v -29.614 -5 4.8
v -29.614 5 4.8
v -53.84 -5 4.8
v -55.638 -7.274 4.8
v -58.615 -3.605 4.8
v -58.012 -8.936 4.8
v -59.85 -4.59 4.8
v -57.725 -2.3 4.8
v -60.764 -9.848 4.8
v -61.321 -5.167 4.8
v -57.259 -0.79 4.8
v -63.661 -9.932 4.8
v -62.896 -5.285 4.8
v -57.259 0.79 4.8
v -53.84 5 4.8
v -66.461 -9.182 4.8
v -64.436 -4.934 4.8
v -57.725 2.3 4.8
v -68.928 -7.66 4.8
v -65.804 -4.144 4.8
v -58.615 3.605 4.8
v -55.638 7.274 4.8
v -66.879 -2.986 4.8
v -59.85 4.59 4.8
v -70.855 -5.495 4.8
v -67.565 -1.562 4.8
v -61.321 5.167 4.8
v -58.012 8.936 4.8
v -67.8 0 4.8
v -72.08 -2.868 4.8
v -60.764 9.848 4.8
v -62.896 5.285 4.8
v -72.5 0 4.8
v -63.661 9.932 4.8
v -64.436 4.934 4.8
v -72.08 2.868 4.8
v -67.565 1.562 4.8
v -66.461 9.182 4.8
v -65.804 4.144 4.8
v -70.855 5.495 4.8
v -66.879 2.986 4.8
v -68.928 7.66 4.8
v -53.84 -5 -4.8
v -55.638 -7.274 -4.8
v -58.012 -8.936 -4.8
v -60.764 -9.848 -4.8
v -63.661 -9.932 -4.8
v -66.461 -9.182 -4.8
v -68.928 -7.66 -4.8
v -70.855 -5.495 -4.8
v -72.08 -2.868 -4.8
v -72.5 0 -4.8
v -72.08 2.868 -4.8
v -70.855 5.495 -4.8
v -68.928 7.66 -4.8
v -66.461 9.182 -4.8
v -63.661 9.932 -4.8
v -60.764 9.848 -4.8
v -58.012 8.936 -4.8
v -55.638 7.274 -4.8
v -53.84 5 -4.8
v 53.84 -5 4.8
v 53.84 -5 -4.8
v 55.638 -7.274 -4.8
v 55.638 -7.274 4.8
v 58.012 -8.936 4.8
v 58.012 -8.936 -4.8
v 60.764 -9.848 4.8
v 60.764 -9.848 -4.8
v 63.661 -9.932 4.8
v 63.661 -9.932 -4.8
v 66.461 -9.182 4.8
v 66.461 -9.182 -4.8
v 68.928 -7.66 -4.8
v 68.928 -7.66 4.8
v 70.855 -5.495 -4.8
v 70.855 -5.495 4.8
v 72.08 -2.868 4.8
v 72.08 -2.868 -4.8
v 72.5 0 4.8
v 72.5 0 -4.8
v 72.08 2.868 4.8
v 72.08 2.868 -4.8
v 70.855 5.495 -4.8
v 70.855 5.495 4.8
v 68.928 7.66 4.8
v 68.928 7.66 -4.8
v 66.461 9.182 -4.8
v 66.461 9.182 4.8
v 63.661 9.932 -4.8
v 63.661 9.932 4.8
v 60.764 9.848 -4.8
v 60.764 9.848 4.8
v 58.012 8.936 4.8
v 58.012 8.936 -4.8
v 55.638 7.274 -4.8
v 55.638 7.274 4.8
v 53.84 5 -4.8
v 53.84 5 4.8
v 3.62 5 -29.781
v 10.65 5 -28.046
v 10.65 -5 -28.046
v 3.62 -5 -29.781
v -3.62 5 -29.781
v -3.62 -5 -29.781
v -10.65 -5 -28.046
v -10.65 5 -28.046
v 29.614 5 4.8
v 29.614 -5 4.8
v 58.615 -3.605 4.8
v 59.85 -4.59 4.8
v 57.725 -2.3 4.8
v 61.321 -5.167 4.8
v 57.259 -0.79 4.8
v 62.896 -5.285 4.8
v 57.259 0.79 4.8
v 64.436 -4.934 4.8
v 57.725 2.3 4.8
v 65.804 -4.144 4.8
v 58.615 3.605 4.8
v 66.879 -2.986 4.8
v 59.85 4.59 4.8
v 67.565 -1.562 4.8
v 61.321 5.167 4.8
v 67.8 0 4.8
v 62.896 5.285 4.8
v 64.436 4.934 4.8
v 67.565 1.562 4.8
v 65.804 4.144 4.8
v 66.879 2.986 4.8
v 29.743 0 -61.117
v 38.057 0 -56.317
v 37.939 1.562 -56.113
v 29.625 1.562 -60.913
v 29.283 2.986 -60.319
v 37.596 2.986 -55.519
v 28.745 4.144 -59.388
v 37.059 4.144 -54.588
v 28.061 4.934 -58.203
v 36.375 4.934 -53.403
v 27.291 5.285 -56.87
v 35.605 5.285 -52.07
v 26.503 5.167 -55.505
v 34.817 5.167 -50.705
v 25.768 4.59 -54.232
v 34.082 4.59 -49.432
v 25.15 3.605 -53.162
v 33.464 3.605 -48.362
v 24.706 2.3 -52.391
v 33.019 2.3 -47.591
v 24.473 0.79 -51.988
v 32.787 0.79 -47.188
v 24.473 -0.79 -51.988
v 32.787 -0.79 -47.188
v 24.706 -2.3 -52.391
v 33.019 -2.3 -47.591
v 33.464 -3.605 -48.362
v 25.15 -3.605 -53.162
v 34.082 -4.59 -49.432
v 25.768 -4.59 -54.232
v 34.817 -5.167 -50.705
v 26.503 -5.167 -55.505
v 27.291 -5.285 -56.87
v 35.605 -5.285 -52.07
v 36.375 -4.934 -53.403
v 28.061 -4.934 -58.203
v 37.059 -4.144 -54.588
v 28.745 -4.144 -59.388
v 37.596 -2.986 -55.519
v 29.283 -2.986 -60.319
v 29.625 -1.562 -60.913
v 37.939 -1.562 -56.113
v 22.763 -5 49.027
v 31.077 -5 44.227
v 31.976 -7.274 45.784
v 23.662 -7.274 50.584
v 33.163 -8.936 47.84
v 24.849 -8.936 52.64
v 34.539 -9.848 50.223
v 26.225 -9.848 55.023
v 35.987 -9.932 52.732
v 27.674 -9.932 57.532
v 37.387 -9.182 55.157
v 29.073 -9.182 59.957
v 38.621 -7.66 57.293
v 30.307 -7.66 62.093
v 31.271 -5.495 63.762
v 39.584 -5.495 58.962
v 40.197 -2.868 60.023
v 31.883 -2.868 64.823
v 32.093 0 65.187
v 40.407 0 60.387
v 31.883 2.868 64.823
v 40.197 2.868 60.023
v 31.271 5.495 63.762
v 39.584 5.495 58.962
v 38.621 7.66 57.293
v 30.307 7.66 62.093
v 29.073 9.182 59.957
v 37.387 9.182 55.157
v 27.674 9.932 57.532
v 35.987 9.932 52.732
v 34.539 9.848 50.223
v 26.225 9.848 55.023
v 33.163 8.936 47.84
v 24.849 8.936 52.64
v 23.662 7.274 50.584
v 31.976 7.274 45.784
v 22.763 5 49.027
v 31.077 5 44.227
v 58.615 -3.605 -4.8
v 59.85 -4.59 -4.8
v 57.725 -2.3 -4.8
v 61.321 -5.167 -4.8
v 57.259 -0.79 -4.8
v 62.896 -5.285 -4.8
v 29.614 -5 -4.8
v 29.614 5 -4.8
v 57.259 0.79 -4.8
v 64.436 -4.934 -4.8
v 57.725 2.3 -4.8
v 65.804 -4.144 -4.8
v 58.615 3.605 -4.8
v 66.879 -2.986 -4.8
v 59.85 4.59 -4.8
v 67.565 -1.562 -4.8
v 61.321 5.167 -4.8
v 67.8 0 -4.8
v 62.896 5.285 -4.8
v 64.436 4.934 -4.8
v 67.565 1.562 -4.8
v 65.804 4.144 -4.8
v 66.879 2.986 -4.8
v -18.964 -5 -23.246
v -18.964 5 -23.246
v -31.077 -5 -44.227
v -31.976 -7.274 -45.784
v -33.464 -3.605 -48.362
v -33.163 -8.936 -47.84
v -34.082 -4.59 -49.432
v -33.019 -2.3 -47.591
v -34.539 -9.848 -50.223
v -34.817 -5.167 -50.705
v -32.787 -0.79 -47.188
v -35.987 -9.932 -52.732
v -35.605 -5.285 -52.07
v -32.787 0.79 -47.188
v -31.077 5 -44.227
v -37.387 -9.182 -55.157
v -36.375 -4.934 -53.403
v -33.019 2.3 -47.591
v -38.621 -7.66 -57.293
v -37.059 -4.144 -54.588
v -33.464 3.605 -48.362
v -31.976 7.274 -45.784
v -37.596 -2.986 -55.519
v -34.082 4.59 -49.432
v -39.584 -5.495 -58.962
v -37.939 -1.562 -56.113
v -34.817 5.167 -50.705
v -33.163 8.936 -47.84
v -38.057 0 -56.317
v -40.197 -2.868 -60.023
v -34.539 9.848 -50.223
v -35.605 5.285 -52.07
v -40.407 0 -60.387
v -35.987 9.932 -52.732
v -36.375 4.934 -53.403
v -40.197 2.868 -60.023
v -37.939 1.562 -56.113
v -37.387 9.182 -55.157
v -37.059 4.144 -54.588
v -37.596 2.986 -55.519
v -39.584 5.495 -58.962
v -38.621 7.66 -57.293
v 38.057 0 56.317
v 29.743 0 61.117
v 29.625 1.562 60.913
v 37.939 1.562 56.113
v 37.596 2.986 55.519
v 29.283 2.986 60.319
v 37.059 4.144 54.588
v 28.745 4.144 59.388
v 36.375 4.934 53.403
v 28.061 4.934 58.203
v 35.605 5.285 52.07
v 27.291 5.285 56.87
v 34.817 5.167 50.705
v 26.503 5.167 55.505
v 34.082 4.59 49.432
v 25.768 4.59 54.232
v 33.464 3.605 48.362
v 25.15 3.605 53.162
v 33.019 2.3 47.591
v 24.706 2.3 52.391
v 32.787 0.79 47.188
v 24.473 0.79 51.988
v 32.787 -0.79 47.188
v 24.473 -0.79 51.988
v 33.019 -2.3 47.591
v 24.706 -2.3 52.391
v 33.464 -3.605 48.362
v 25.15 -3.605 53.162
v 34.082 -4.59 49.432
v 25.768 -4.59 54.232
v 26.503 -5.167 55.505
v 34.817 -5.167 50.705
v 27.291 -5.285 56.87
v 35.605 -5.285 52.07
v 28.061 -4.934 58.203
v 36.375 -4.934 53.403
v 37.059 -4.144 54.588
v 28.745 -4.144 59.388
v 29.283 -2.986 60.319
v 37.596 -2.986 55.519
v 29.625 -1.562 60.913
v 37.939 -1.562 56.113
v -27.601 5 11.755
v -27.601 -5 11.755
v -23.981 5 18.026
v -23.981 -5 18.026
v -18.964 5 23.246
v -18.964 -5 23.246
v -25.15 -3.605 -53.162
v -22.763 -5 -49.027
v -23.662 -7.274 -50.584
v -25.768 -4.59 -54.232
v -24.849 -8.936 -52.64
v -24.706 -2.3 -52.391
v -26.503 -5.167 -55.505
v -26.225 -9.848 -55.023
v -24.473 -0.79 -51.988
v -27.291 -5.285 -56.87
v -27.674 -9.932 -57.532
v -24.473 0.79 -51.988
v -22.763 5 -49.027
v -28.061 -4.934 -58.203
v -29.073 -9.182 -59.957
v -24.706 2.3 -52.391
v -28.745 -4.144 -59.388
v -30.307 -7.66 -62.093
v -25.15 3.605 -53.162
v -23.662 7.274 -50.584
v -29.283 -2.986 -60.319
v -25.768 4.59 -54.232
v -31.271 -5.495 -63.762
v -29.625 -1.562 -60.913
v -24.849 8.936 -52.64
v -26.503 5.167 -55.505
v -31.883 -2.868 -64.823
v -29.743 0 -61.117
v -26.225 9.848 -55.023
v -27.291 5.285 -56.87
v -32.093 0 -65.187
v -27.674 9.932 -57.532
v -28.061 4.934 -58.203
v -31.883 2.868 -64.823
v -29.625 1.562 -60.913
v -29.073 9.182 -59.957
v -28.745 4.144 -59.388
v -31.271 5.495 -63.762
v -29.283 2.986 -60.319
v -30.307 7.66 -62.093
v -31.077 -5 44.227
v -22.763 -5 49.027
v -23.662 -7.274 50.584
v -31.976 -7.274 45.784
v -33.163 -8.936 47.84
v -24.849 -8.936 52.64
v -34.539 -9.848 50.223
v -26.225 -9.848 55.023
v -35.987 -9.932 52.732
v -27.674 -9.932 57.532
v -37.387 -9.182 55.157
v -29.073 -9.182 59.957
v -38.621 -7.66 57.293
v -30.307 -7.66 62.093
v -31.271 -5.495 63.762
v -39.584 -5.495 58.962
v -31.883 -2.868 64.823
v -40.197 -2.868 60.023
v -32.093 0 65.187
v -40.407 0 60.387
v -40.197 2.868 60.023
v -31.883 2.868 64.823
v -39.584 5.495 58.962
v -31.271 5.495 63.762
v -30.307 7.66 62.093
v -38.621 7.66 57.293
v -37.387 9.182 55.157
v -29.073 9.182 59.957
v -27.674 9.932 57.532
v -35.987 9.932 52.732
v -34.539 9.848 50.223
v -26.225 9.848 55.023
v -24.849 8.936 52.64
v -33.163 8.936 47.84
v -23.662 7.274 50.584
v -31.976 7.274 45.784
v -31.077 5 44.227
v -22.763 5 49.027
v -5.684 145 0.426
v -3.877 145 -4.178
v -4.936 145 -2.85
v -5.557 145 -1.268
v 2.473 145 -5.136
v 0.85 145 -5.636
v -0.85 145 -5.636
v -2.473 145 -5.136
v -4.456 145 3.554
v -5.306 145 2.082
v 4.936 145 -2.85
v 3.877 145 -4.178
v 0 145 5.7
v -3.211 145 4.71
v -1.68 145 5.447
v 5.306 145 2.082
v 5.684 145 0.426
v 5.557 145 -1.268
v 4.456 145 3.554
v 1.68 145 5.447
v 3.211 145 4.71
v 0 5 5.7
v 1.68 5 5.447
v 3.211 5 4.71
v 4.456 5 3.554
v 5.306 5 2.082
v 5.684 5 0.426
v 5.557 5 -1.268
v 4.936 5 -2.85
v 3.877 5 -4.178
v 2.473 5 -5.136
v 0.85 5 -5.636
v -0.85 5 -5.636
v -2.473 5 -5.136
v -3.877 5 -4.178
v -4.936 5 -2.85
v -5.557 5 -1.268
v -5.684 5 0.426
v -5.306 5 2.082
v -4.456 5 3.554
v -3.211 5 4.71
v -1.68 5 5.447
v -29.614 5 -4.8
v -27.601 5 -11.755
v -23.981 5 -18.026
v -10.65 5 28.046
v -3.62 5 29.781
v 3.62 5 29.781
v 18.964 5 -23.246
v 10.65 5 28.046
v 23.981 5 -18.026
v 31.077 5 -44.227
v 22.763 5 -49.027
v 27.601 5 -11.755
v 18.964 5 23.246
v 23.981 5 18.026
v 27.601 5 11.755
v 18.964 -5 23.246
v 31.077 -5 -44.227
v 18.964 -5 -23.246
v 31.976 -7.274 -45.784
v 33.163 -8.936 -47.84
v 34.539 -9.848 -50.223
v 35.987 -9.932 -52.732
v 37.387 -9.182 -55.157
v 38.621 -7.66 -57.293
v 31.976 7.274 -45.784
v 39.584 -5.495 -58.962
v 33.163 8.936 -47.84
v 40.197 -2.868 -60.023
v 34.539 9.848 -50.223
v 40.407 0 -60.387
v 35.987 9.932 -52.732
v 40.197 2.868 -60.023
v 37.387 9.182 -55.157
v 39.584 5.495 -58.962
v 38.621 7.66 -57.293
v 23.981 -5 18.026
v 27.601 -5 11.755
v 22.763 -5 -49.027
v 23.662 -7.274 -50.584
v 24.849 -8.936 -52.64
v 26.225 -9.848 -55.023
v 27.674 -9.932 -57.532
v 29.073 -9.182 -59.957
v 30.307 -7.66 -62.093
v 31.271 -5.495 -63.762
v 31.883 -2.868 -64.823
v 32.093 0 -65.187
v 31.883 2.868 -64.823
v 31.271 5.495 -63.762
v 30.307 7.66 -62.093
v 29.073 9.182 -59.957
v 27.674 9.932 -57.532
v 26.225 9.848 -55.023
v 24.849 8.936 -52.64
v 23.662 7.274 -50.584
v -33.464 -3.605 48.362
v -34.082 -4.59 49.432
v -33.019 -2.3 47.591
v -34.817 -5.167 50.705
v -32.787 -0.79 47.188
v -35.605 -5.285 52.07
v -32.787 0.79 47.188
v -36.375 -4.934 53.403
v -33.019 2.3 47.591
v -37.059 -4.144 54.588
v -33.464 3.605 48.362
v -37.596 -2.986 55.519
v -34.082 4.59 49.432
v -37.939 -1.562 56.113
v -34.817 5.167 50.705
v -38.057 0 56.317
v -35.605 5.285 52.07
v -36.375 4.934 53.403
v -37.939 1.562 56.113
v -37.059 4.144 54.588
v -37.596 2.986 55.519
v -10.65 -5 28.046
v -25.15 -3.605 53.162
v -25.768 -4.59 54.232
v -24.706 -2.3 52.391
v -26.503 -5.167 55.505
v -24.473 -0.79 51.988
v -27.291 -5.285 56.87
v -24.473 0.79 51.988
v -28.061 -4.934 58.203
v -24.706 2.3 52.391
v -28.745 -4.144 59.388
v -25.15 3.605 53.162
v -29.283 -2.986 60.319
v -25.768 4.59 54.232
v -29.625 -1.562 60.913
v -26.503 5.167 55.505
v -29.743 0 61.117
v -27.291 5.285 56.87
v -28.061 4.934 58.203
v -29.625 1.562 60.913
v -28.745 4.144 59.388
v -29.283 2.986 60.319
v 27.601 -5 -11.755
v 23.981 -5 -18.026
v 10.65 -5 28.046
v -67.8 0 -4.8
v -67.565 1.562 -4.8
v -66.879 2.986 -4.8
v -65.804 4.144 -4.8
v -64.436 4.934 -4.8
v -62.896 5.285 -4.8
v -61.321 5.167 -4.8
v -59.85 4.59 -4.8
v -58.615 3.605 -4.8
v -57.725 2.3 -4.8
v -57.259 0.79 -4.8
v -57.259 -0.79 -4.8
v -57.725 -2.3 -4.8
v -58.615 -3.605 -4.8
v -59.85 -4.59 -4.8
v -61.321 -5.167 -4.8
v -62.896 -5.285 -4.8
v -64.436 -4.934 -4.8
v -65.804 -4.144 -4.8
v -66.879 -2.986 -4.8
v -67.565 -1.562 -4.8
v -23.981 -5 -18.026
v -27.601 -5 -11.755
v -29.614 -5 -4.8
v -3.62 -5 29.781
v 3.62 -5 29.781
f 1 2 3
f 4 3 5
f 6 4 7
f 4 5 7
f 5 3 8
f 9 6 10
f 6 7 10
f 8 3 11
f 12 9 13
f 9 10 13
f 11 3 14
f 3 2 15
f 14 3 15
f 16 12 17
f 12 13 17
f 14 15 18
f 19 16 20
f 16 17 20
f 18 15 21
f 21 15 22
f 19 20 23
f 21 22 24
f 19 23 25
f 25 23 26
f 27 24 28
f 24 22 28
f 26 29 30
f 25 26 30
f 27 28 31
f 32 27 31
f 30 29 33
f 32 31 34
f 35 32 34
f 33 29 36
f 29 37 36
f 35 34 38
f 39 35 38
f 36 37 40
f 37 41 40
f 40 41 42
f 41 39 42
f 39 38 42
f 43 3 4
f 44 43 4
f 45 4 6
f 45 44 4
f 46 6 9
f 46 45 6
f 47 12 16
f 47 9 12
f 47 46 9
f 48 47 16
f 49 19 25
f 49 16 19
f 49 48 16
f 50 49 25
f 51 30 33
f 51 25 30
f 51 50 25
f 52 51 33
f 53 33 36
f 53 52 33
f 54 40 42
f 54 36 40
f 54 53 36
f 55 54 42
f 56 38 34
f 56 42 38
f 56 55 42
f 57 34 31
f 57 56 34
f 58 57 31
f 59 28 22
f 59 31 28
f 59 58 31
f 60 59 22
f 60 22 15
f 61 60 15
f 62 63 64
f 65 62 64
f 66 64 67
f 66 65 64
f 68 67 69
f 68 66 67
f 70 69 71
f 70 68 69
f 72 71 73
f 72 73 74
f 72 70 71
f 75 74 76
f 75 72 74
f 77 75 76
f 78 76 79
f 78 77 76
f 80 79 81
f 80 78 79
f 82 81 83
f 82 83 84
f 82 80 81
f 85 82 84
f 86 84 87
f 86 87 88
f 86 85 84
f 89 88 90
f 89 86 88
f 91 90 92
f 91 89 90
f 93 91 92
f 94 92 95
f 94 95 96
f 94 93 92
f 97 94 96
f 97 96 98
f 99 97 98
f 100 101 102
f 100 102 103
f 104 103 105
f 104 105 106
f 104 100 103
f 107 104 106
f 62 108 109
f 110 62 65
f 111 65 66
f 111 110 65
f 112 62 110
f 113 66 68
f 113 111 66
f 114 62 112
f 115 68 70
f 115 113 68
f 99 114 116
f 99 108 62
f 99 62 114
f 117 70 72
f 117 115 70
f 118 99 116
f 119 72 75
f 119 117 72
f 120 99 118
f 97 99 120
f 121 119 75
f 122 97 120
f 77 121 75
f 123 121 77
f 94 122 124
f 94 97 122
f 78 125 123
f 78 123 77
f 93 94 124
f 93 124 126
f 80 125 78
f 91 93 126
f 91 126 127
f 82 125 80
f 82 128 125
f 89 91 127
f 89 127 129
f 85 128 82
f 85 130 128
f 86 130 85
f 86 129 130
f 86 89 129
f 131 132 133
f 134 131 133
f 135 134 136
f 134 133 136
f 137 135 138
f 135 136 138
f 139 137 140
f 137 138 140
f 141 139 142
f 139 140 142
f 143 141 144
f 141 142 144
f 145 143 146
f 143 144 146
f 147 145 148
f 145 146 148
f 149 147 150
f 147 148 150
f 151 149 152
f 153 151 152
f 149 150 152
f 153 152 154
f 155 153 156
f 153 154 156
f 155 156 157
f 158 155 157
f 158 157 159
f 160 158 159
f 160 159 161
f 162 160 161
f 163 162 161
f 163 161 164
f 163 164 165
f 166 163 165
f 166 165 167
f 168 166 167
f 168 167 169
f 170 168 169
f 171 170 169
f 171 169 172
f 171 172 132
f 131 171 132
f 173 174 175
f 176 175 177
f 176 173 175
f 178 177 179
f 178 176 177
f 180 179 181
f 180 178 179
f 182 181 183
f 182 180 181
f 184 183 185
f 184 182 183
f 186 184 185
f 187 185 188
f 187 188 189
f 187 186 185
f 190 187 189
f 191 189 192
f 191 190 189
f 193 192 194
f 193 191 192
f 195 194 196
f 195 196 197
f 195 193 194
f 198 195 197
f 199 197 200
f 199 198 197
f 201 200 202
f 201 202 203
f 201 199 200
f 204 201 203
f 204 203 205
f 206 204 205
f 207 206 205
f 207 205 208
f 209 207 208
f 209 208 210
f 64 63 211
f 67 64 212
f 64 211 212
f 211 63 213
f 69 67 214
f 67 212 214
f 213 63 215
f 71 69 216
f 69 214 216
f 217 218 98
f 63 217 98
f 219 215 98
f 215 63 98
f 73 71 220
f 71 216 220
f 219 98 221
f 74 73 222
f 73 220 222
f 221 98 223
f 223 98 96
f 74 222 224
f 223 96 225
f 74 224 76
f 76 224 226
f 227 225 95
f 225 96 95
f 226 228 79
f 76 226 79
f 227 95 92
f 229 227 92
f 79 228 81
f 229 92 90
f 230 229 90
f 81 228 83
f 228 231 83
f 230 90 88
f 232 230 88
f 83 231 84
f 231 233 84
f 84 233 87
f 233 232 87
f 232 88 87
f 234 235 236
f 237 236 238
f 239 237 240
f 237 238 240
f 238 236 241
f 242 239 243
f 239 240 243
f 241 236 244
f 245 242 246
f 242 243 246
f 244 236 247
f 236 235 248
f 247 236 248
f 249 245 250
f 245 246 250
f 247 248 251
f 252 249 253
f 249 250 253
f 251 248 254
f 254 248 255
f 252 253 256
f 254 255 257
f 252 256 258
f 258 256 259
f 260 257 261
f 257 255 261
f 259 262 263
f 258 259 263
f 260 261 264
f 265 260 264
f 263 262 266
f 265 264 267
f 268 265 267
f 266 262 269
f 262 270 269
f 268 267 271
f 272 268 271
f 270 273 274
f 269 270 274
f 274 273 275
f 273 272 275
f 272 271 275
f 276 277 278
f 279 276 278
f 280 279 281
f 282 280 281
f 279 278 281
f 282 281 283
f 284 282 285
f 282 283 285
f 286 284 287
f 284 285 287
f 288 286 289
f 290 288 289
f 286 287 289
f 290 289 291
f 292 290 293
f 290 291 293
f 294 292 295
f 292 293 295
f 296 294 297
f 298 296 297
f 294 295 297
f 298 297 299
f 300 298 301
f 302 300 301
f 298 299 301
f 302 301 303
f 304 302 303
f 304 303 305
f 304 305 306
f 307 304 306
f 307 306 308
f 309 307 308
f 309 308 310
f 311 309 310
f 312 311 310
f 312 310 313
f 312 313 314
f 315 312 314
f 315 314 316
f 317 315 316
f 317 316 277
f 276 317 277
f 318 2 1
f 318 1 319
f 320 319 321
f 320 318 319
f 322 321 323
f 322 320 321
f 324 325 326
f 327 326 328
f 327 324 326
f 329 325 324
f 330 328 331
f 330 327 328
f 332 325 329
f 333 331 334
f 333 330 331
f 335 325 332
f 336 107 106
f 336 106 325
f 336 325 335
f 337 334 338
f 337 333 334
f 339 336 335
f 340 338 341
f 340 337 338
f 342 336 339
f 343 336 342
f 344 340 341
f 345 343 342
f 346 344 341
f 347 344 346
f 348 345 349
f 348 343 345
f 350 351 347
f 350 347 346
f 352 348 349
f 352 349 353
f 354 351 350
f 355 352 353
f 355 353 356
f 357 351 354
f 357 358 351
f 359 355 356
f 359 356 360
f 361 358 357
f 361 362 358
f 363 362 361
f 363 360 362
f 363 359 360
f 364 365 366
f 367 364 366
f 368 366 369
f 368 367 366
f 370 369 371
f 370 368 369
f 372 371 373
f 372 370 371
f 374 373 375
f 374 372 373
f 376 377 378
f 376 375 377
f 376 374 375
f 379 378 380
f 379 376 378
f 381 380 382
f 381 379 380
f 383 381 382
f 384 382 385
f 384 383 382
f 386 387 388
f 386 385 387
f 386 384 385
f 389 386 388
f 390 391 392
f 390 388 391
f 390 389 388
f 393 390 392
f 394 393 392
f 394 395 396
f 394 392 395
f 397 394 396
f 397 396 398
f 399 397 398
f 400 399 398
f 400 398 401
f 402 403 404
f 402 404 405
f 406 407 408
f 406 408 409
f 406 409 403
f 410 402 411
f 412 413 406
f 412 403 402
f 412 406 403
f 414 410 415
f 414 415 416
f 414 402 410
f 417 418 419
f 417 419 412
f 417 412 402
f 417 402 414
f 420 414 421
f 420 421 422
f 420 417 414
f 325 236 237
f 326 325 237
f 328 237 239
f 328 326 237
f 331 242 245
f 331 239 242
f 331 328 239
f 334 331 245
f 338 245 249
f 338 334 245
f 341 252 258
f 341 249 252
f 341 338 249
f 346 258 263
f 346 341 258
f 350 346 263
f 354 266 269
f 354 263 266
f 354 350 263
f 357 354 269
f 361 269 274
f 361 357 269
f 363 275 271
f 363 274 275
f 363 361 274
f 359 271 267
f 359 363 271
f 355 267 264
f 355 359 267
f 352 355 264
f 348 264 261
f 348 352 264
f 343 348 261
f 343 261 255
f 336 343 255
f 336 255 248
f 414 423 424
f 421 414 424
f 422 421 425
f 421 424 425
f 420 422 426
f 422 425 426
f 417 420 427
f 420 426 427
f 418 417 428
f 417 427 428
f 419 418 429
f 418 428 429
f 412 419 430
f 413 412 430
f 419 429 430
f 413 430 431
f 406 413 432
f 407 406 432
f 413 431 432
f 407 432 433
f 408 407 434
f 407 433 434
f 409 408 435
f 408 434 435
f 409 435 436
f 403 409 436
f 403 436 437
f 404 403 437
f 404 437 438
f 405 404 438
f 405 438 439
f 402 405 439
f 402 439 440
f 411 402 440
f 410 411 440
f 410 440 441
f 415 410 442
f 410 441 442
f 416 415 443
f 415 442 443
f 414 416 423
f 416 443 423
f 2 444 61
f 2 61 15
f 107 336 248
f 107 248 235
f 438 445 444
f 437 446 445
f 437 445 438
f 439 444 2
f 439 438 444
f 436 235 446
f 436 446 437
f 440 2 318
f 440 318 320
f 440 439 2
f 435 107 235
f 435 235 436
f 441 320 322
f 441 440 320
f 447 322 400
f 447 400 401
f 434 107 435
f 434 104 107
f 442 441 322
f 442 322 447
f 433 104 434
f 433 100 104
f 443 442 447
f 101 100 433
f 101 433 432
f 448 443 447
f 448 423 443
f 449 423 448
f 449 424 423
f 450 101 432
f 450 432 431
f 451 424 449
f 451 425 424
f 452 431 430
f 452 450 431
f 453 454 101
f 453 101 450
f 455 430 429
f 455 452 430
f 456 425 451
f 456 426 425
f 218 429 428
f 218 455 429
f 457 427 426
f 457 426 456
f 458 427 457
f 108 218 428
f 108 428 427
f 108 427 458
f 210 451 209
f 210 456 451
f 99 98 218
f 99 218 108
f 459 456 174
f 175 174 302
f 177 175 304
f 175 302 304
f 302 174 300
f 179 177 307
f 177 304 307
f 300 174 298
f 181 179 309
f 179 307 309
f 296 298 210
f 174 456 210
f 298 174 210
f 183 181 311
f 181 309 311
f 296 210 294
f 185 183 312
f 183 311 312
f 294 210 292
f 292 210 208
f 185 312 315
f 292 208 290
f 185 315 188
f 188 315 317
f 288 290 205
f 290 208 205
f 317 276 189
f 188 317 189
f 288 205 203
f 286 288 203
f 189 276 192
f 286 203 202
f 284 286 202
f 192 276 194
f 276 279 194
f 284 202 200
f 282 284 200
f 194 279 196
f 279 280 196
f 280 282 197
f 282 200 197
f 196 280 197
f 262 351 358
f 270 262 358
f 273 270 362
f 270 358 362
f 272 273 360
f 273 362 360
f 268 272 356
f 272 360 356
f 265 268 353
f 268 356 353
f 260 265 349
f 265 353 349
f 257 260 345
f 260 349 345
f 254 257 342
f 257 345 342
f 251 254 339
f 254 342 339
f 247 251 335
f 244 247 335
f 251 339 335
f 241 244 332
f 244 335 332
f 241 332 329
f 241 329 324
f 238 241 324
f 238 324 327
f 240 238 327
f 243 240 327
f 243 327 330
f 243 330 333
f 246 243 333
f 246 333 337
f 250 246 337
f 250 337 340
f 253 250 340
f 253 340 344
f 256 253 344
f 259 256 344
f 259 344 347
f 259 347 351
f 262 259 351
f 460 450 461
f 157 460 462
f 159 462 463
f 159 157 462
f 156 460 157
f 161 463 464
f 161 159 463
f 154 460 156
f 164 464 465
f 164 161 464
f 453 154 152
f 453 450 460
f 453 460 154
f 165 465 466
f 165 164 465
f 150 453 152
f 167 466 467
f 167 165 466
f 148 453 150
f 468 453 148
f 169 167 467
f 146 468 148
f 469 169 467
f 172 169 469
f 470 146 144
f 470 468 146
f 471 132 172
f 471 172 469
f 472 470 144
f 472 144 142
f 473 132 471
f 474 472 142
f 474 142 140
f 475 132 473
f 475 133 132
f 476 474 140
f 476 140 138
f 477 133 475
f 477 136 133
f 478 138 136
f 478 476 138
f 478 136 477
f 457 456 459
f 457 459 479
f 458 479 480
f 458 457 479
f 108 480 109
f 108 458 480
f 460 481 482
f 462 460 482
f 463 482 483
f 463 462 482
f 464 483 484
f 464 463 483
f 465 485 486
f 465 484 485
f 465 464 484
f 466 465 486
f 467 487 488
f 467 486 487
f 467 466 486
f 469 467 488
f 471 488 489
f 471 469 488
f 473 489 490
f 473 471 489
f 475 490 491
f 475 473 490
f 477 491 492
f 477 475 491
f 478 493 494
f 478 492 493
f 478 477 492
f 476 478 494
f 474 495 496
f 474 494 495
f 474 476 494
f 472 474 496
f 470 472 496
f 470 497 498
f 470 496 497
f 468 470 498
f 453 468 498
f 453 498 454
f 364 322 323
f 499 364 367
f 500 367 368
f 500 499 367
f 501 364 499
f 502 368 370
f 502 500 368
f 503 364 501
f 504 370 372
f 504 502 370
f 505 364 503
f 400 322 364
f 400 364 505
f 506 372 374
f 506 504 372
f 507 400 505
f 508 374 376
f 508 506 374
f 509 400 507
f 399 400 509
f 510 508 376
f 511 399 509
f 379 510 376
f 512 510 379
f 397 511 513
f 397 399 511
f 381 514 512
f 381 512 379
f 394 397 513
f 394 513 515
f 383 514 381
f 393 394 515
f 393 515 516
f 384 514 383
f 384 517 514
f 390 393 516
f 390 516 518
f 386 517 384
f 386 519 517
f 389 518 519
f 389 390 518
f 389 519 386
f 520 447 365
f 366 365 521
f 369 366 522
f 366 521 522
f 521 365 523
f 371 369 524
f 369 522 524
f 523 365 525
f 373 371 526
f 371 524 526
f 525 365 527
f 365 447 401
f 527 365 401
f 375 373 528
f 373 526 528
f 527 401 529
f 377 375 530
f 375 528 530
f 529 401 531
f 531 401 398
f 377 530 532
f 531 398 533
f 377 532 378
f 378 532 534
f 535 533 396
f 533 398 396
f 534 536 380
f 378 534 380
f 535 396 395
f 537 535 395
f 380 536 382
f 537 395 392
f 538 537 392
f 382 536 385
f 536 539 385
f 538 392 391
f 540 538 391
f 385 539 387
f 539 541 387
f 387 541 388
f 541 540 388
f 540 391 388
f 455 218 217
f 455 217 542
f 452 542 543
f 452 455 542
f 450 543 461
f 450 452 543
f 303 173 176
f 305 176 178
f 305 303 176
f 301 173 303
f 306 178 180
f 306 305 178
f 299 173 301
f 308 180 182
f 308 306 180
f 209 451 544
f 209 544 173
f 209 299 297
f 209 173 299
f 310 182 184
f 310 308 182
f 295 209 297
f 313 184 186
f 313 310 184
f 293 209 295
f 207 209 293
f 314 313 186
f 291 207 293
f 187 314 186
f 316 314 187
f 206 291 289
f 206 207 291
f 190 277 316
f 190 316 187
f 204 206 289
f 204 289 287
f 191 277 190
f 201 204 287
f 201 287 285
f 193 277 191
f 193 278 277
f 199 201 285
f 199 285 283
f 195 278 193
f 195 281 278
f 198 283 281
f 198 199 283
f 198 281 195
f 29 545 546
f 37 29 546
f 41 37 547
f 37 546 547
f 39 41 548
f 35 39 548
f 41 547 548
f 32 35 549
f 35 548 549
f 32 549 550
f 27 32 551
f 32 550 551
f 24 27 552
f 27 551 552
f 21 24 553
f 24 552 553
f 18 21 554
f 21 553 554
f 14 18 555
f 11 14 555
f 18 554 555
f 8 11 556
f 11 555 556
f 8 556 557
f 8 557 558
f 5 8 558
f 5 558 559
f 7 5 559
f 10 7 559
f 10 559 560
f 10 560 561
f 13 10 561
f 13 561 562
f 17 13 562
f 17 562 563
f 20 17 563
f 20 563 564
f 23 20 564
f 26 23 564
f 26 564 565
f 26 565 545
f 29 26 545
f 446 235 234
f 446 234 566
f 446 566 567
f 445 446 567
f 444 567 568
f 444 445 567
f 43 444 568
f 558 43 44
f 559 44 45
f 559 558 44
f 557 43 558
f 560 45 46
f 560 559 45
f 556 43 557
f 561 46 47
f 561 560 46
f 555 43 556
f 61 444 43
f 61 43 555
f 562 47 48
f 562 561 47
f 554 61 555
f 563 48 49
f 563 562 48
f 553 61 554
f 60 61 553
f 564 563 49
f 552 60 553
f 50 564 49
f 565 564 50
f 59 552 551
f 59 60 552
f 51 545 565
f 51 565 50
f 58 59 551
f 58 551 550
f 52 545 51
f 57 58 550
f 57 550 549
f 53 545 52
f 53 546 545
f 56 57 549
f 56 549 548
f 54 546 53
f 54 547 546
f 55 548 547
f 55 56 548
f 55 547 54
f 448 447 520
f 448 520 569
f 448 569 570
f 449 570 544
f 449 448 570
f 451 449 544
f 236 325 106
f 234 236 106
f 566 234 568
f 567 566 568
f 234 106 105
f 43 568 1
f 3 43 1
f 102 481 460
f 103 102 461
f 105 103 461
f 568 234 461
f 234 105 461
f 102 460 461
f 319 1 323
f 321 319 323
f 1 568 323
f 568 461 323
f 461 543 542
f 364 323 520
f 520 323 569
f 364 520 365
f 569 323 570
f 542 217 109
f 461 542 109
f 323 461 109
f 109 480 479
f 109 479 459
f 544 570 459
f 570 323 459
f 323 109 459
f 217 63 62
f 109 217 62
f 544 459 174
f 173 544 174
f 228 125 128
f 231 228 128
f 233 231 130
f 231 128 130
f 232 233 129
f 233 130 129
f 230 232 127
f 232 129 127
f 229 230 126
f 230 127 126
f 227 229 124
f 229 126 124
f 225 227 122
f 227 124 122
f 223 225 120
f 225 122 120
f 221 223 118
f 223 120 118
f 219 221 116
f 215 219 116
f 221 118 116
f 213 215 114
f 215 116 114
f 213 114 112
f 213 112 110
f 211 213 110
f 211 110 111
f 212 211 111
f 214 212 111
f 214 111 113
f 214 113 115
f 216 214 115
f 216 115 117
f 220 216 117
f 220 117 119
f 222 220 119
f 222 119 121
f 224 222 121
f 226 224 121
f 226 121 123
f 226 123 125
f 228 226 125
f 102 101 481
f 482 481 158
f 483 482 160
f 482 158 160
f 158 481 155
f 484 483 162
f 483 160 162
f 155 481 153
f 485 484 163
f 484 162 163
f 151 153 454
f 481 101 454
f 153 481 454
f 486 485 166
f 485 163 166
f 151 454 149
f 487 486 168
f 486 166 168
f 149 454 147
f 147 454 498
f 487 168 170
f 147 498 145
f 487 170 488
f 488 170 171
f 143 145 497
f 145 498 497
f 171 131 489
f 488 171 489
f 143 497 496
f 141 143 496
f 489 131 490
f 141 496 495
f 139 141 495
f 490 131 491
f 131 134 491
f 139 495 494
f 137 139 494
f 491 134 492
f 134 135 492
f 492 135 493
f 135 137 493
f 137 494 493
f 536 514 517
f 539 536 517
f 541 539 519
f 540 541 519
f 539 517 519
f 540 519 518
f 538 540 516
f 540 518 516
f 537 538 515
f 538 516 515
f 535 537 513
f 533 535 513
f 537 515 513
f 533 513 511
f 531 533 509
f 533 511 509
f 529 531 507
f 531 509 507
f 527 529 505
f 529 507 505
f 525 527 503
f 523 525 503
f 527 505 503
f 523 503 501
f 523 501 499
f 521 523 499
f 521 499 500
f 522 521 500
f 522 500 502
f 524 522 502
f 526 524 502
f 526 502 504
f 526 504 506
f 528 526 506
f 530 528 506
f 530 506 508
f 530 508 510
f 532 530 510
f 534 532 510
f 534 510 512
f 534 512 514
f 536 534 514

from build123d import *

# Parameters (mm, degrees)
SKETCH_1_R               = 30
EXTRUDE_1_DEPTH          = 5
SKETCH_2_W               = 50
SKETCH_2_H               = 9.6
EXTRUDE_2_DEPTH          = 5
SKETCH_3_R               = 10
EXTRUDE_3_DEPTH          = 9.6
SKETCH_4_R               = 5.3
CUT_EXTRUDE_1_DEPTH      = 10
PATTERN_CIRCULAR_1_COUNT = 6
SKETCH_5_R               = 5.7
EXTRUDE_11_4_140_DEPTH   = 140


with BuildPart() as part:
    # 草图1 → 凸台-拉伸1 (new, symmetric)
    with BuildSketch(Plane(origin=(0, 0, 0), x_dir=(1, 0, 0), z_dir=(0, 1, 0))):
        with Locations(Location((0, 0, 0), (0, 0, 270))):
            Circle(SKETCH_1_R)
    extrude(amount=EXTRUDE_1_DEPTH, both=True)

    # 草图2 → 凸台-拉伸2 (add, symmetric)
    with BuildSketch(Plane(origin=(0, 0, 0), x_dir=(1, 0, 0), z_dir=(0, 1, 0))):
        with Locations((45, 0)):
            Rectangle(SKETCH_2_W, SKETCH_2_H)
    extrude_2 = extrude(amount=EXTRUDE_2_DEPTH, both=True)

    # 草图3 → 凸台-拉伸3 (add)
    with BuildSketch(Plane.XY.offset(4.8)):
        with Locations((62.5, 0)):
            Circle(SKETCH_3_R)
    extrude_3 = extrude(amount=-EXTRUDE_3_DEPTH)

    # 草图4 → 切除-拉伸1 (cut)
    with BuildSketch(Plane.XY.offset(4.8)):
        with Locations((62.5, 0)):
            Circle(SKETCH_4_R)
    cut_extrude_1 = extrude(amount=-CUT_EXTRUDE_1_DEPTH, mode=Mode.SUBTRACT)

    # 阵列(圆周)1: 凸台-拉伸2, 凸台-拉伸3, 切除-拉伸1 ×6 about axis
    pattern_circular_1_axis = Axis((0, 5, 0), (0, -1, 0))
    add([extrude_2.rotate(pattern_circular_1_axis, i * 360 / PATTERN_CIRCULAR_1_COUNT) for i in range(1, PATTERN_CIRCULAR_1_COUNT)])
    add([extrude_3.rotate(pattern_circular_1_axis, i * 360 / PATTERN_CIRCULAR_1_COUNT) for i in range(1, PATTERN_CIRCULAR_1_COUNT)])
    add([cut_extrude_1.rotate(pattern_circular_1_axis, i * 360 / PATTERN_CIRCULAR_1_COUNT) for i in range(1, PATTERN_CIRCULAR_1_COUNT)], mode=Mode.SUBTRACT)

    # 草图5 → 细杆_直径11.4_长度140 (add)
    with BuildSketch(Plane(origin=(0, 5, 0), x_dir=(1, 0, 0), z_dir=(0, 1, 0))):
        with Locations(Location((0, 0, 0), (0, 0, 270))):
            Circle(SKETCH_5_R)
    extrude(amount=EXTRUDE_11_4_140_DEPTH)


solid = part.part
